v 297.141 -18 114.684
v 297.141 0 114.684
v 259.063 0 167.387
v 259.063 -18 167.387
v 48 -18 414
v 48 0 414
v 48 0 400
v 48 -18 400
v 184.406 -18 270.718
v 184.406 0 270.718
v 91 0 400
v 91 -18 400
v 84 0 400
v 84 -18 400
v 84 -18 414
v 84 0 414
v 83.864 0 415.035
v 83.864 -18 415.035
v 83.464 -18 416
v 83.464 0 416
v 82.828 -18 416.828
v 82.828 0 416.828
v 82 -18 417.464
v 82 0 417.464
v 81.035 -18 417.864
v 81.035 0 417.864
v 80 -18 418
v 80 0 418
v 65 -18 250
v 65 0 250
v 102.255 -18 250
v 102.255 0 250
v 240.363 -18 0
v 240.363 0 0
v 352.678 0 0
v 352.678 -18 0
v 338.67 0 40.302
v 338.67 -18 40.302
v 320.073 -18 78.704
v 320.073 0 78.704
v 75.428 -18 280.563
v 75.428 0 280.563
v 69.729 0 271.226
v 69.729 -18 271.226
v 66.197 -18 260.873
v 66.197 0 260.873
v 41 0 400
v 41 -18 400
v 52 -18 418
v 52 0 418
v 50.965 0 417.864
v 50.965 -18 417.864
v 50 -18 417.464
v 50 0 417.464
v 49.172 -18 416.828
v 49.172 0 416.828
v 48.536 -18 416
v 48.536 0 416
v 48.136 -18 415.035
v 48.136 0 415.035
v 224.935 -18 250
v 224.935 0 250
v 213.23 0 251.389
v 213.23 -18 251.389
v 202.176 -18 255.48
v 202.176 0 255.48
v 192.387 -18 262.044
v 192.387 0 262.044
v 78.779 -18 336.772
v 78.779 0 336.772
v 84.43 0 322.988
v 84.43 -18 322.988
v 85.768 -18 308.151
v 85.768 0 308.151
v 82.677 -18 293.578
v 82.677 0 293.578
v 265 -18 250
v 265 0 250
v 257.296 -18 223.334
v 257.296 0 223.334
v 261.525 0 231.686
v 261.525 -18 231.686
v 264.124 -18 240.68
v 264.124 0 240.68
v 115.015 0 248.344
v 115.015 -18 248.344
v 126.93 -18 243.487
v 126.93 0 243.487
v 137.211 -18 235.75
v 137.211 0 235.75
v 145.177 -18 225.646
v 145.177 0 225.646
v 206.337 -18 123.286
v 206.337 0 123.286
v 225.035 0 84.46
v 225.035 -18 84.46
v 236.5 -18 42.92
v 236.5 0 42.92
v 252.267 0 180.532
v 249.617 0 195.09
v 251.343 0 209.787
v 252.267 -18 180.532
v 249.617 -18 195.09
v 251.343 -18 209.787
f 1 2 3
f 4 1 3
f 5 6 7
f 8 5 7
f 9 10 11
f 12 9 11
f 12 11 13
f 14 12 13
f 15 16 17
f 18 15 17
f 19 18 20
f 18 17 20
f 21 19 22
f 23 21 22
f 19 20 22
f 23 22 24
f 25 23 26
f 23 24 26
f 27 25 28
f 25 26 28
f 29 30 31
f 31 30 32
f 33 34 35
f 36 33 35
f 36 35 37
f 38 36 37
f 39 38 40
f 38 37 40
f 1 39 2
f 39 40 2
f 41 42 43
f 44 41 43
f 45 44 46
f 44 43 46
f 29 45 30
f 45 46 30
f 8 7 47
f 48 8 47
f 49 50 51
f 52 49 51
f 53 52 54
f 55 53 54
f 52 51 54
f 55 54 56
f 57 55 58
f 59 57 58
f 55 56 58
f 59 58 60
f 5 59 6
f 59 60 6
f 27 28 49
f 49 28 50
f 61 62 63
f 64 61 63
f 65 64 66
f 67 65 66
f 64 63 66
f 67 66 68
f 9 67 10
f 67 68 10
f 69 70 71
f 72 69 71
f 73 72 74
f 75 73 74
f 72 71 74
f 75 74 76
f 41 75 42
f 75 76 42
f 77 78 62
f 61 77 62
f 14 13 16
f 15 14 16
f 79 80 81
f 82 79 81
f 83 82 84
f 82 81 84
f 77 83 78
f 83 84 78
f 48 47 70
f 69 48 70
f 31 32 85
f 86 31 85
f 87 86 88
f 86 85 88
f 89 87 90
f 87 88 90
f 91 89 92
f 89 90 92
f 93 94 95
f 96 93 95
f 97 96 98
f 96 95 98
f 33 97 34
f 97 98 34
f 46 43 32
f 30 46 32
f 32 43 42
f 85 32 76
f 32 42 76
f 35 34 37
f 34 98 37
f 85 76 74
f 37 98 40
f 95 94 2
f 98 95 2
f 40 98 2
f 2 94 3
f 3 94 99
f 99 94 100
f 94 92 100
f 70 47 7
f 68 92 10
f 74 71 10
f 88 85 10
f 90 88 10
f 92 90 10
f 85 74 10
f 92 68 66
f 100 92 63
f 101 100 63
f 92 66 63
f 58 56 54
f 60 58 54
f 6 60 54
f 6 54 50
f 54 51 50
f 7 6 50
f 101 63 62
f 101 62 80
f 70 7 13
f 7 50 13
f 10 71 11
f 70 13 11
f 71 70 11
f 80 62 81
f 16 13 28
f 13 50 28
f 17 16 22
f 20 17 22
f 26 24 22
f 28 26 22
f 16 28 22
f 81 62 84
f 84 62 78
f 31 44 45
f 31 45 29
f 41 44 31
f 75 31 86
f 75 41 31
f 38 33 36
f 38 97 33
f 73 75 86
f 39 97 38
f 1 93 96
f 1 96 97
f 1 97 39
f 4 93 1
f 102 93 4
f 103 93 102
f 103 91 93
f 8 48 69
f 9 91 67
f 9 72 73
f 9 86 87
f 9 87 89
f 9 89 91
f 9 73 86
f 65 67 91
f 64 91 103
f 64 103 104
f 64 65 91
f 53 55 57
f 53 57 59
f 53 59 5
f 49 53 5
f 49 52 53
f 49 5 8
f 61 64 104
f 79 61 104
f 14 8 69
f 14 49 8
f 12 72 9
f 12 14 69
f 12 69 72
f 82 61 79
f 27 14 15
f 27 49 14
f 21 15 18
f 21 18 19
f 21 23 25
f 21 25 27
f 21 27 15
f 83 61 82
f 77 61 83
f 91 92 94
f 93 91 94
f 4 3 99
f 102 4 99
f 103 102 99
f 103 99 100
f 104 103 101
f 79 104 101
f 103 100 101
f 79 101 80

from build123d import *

# Parameters (mm, degrees)
F1_DEPTH = 18


with BuildPart() as f1:
    # F0 (on Front) → F1 (new body)
    with BuildSketch(Plane.XZ):
        with BuildLine():
            Line((240.362719, 0), (280, 0))
            Line((280, 0), (352.678155, 0))
            ThreePointArc((352.678155, 0), (329.930673, 59.773689), (297.140698, 114.684155))
            Line((297.140698, 114.684155), (259.063123, 167.386681))
            ThreePointArc((259.063123, 167.386681), (249.616666, 195.090013), (257.29587, 223.334303))
            ThreePointArc((257.29587, 223.334303), (263.03537, 236.121843), (265, 250))
            Line((265, 250), (224.934809, 250))
            ThreePointArc((224.934809, 250), (202.176253, 255.479801), (184.406191, 270.718074))
            Line((184.406191, 270.718074), (91, 400))
            Line((91, 400), (84, 400))
            Line((84, 400), (84, 414))
            ThreePointArc((84, 414), (82.828427, 416.828427), (80, 418))
            Line((80, 418), (52, 418))
            ThreePointArc((52, 418), (49.171573, 416.828427), (48, 414))
            Line((48, 414), (48, 400))
            Line((48, 400), (41, 400))
            Line((41, 400), (78.778869, 336.771767))
            ThreePointArc((78.778869, 336.771767), (85.768369, 308.150895), (75.428478, 280.562962))
            ThreePointArc((75.428478, 280.562962), (67.678884, 266.146577), (65, 250))
            Line((65, 250), (102.254694, 250))
            ThreePointArc((102.254694, 250), (126.92966, 243.48731), (145.176608, 225.645844))
            Line((145.176608, 225.645844), (206.336559, 123.286094))
            ThreePointArc((206.336559, 123.286094), (231.700078, 63.947714), (240.362719, 0))
        make_face()
    extrude(amount=F1_DEPTH)


solid = f1.part
